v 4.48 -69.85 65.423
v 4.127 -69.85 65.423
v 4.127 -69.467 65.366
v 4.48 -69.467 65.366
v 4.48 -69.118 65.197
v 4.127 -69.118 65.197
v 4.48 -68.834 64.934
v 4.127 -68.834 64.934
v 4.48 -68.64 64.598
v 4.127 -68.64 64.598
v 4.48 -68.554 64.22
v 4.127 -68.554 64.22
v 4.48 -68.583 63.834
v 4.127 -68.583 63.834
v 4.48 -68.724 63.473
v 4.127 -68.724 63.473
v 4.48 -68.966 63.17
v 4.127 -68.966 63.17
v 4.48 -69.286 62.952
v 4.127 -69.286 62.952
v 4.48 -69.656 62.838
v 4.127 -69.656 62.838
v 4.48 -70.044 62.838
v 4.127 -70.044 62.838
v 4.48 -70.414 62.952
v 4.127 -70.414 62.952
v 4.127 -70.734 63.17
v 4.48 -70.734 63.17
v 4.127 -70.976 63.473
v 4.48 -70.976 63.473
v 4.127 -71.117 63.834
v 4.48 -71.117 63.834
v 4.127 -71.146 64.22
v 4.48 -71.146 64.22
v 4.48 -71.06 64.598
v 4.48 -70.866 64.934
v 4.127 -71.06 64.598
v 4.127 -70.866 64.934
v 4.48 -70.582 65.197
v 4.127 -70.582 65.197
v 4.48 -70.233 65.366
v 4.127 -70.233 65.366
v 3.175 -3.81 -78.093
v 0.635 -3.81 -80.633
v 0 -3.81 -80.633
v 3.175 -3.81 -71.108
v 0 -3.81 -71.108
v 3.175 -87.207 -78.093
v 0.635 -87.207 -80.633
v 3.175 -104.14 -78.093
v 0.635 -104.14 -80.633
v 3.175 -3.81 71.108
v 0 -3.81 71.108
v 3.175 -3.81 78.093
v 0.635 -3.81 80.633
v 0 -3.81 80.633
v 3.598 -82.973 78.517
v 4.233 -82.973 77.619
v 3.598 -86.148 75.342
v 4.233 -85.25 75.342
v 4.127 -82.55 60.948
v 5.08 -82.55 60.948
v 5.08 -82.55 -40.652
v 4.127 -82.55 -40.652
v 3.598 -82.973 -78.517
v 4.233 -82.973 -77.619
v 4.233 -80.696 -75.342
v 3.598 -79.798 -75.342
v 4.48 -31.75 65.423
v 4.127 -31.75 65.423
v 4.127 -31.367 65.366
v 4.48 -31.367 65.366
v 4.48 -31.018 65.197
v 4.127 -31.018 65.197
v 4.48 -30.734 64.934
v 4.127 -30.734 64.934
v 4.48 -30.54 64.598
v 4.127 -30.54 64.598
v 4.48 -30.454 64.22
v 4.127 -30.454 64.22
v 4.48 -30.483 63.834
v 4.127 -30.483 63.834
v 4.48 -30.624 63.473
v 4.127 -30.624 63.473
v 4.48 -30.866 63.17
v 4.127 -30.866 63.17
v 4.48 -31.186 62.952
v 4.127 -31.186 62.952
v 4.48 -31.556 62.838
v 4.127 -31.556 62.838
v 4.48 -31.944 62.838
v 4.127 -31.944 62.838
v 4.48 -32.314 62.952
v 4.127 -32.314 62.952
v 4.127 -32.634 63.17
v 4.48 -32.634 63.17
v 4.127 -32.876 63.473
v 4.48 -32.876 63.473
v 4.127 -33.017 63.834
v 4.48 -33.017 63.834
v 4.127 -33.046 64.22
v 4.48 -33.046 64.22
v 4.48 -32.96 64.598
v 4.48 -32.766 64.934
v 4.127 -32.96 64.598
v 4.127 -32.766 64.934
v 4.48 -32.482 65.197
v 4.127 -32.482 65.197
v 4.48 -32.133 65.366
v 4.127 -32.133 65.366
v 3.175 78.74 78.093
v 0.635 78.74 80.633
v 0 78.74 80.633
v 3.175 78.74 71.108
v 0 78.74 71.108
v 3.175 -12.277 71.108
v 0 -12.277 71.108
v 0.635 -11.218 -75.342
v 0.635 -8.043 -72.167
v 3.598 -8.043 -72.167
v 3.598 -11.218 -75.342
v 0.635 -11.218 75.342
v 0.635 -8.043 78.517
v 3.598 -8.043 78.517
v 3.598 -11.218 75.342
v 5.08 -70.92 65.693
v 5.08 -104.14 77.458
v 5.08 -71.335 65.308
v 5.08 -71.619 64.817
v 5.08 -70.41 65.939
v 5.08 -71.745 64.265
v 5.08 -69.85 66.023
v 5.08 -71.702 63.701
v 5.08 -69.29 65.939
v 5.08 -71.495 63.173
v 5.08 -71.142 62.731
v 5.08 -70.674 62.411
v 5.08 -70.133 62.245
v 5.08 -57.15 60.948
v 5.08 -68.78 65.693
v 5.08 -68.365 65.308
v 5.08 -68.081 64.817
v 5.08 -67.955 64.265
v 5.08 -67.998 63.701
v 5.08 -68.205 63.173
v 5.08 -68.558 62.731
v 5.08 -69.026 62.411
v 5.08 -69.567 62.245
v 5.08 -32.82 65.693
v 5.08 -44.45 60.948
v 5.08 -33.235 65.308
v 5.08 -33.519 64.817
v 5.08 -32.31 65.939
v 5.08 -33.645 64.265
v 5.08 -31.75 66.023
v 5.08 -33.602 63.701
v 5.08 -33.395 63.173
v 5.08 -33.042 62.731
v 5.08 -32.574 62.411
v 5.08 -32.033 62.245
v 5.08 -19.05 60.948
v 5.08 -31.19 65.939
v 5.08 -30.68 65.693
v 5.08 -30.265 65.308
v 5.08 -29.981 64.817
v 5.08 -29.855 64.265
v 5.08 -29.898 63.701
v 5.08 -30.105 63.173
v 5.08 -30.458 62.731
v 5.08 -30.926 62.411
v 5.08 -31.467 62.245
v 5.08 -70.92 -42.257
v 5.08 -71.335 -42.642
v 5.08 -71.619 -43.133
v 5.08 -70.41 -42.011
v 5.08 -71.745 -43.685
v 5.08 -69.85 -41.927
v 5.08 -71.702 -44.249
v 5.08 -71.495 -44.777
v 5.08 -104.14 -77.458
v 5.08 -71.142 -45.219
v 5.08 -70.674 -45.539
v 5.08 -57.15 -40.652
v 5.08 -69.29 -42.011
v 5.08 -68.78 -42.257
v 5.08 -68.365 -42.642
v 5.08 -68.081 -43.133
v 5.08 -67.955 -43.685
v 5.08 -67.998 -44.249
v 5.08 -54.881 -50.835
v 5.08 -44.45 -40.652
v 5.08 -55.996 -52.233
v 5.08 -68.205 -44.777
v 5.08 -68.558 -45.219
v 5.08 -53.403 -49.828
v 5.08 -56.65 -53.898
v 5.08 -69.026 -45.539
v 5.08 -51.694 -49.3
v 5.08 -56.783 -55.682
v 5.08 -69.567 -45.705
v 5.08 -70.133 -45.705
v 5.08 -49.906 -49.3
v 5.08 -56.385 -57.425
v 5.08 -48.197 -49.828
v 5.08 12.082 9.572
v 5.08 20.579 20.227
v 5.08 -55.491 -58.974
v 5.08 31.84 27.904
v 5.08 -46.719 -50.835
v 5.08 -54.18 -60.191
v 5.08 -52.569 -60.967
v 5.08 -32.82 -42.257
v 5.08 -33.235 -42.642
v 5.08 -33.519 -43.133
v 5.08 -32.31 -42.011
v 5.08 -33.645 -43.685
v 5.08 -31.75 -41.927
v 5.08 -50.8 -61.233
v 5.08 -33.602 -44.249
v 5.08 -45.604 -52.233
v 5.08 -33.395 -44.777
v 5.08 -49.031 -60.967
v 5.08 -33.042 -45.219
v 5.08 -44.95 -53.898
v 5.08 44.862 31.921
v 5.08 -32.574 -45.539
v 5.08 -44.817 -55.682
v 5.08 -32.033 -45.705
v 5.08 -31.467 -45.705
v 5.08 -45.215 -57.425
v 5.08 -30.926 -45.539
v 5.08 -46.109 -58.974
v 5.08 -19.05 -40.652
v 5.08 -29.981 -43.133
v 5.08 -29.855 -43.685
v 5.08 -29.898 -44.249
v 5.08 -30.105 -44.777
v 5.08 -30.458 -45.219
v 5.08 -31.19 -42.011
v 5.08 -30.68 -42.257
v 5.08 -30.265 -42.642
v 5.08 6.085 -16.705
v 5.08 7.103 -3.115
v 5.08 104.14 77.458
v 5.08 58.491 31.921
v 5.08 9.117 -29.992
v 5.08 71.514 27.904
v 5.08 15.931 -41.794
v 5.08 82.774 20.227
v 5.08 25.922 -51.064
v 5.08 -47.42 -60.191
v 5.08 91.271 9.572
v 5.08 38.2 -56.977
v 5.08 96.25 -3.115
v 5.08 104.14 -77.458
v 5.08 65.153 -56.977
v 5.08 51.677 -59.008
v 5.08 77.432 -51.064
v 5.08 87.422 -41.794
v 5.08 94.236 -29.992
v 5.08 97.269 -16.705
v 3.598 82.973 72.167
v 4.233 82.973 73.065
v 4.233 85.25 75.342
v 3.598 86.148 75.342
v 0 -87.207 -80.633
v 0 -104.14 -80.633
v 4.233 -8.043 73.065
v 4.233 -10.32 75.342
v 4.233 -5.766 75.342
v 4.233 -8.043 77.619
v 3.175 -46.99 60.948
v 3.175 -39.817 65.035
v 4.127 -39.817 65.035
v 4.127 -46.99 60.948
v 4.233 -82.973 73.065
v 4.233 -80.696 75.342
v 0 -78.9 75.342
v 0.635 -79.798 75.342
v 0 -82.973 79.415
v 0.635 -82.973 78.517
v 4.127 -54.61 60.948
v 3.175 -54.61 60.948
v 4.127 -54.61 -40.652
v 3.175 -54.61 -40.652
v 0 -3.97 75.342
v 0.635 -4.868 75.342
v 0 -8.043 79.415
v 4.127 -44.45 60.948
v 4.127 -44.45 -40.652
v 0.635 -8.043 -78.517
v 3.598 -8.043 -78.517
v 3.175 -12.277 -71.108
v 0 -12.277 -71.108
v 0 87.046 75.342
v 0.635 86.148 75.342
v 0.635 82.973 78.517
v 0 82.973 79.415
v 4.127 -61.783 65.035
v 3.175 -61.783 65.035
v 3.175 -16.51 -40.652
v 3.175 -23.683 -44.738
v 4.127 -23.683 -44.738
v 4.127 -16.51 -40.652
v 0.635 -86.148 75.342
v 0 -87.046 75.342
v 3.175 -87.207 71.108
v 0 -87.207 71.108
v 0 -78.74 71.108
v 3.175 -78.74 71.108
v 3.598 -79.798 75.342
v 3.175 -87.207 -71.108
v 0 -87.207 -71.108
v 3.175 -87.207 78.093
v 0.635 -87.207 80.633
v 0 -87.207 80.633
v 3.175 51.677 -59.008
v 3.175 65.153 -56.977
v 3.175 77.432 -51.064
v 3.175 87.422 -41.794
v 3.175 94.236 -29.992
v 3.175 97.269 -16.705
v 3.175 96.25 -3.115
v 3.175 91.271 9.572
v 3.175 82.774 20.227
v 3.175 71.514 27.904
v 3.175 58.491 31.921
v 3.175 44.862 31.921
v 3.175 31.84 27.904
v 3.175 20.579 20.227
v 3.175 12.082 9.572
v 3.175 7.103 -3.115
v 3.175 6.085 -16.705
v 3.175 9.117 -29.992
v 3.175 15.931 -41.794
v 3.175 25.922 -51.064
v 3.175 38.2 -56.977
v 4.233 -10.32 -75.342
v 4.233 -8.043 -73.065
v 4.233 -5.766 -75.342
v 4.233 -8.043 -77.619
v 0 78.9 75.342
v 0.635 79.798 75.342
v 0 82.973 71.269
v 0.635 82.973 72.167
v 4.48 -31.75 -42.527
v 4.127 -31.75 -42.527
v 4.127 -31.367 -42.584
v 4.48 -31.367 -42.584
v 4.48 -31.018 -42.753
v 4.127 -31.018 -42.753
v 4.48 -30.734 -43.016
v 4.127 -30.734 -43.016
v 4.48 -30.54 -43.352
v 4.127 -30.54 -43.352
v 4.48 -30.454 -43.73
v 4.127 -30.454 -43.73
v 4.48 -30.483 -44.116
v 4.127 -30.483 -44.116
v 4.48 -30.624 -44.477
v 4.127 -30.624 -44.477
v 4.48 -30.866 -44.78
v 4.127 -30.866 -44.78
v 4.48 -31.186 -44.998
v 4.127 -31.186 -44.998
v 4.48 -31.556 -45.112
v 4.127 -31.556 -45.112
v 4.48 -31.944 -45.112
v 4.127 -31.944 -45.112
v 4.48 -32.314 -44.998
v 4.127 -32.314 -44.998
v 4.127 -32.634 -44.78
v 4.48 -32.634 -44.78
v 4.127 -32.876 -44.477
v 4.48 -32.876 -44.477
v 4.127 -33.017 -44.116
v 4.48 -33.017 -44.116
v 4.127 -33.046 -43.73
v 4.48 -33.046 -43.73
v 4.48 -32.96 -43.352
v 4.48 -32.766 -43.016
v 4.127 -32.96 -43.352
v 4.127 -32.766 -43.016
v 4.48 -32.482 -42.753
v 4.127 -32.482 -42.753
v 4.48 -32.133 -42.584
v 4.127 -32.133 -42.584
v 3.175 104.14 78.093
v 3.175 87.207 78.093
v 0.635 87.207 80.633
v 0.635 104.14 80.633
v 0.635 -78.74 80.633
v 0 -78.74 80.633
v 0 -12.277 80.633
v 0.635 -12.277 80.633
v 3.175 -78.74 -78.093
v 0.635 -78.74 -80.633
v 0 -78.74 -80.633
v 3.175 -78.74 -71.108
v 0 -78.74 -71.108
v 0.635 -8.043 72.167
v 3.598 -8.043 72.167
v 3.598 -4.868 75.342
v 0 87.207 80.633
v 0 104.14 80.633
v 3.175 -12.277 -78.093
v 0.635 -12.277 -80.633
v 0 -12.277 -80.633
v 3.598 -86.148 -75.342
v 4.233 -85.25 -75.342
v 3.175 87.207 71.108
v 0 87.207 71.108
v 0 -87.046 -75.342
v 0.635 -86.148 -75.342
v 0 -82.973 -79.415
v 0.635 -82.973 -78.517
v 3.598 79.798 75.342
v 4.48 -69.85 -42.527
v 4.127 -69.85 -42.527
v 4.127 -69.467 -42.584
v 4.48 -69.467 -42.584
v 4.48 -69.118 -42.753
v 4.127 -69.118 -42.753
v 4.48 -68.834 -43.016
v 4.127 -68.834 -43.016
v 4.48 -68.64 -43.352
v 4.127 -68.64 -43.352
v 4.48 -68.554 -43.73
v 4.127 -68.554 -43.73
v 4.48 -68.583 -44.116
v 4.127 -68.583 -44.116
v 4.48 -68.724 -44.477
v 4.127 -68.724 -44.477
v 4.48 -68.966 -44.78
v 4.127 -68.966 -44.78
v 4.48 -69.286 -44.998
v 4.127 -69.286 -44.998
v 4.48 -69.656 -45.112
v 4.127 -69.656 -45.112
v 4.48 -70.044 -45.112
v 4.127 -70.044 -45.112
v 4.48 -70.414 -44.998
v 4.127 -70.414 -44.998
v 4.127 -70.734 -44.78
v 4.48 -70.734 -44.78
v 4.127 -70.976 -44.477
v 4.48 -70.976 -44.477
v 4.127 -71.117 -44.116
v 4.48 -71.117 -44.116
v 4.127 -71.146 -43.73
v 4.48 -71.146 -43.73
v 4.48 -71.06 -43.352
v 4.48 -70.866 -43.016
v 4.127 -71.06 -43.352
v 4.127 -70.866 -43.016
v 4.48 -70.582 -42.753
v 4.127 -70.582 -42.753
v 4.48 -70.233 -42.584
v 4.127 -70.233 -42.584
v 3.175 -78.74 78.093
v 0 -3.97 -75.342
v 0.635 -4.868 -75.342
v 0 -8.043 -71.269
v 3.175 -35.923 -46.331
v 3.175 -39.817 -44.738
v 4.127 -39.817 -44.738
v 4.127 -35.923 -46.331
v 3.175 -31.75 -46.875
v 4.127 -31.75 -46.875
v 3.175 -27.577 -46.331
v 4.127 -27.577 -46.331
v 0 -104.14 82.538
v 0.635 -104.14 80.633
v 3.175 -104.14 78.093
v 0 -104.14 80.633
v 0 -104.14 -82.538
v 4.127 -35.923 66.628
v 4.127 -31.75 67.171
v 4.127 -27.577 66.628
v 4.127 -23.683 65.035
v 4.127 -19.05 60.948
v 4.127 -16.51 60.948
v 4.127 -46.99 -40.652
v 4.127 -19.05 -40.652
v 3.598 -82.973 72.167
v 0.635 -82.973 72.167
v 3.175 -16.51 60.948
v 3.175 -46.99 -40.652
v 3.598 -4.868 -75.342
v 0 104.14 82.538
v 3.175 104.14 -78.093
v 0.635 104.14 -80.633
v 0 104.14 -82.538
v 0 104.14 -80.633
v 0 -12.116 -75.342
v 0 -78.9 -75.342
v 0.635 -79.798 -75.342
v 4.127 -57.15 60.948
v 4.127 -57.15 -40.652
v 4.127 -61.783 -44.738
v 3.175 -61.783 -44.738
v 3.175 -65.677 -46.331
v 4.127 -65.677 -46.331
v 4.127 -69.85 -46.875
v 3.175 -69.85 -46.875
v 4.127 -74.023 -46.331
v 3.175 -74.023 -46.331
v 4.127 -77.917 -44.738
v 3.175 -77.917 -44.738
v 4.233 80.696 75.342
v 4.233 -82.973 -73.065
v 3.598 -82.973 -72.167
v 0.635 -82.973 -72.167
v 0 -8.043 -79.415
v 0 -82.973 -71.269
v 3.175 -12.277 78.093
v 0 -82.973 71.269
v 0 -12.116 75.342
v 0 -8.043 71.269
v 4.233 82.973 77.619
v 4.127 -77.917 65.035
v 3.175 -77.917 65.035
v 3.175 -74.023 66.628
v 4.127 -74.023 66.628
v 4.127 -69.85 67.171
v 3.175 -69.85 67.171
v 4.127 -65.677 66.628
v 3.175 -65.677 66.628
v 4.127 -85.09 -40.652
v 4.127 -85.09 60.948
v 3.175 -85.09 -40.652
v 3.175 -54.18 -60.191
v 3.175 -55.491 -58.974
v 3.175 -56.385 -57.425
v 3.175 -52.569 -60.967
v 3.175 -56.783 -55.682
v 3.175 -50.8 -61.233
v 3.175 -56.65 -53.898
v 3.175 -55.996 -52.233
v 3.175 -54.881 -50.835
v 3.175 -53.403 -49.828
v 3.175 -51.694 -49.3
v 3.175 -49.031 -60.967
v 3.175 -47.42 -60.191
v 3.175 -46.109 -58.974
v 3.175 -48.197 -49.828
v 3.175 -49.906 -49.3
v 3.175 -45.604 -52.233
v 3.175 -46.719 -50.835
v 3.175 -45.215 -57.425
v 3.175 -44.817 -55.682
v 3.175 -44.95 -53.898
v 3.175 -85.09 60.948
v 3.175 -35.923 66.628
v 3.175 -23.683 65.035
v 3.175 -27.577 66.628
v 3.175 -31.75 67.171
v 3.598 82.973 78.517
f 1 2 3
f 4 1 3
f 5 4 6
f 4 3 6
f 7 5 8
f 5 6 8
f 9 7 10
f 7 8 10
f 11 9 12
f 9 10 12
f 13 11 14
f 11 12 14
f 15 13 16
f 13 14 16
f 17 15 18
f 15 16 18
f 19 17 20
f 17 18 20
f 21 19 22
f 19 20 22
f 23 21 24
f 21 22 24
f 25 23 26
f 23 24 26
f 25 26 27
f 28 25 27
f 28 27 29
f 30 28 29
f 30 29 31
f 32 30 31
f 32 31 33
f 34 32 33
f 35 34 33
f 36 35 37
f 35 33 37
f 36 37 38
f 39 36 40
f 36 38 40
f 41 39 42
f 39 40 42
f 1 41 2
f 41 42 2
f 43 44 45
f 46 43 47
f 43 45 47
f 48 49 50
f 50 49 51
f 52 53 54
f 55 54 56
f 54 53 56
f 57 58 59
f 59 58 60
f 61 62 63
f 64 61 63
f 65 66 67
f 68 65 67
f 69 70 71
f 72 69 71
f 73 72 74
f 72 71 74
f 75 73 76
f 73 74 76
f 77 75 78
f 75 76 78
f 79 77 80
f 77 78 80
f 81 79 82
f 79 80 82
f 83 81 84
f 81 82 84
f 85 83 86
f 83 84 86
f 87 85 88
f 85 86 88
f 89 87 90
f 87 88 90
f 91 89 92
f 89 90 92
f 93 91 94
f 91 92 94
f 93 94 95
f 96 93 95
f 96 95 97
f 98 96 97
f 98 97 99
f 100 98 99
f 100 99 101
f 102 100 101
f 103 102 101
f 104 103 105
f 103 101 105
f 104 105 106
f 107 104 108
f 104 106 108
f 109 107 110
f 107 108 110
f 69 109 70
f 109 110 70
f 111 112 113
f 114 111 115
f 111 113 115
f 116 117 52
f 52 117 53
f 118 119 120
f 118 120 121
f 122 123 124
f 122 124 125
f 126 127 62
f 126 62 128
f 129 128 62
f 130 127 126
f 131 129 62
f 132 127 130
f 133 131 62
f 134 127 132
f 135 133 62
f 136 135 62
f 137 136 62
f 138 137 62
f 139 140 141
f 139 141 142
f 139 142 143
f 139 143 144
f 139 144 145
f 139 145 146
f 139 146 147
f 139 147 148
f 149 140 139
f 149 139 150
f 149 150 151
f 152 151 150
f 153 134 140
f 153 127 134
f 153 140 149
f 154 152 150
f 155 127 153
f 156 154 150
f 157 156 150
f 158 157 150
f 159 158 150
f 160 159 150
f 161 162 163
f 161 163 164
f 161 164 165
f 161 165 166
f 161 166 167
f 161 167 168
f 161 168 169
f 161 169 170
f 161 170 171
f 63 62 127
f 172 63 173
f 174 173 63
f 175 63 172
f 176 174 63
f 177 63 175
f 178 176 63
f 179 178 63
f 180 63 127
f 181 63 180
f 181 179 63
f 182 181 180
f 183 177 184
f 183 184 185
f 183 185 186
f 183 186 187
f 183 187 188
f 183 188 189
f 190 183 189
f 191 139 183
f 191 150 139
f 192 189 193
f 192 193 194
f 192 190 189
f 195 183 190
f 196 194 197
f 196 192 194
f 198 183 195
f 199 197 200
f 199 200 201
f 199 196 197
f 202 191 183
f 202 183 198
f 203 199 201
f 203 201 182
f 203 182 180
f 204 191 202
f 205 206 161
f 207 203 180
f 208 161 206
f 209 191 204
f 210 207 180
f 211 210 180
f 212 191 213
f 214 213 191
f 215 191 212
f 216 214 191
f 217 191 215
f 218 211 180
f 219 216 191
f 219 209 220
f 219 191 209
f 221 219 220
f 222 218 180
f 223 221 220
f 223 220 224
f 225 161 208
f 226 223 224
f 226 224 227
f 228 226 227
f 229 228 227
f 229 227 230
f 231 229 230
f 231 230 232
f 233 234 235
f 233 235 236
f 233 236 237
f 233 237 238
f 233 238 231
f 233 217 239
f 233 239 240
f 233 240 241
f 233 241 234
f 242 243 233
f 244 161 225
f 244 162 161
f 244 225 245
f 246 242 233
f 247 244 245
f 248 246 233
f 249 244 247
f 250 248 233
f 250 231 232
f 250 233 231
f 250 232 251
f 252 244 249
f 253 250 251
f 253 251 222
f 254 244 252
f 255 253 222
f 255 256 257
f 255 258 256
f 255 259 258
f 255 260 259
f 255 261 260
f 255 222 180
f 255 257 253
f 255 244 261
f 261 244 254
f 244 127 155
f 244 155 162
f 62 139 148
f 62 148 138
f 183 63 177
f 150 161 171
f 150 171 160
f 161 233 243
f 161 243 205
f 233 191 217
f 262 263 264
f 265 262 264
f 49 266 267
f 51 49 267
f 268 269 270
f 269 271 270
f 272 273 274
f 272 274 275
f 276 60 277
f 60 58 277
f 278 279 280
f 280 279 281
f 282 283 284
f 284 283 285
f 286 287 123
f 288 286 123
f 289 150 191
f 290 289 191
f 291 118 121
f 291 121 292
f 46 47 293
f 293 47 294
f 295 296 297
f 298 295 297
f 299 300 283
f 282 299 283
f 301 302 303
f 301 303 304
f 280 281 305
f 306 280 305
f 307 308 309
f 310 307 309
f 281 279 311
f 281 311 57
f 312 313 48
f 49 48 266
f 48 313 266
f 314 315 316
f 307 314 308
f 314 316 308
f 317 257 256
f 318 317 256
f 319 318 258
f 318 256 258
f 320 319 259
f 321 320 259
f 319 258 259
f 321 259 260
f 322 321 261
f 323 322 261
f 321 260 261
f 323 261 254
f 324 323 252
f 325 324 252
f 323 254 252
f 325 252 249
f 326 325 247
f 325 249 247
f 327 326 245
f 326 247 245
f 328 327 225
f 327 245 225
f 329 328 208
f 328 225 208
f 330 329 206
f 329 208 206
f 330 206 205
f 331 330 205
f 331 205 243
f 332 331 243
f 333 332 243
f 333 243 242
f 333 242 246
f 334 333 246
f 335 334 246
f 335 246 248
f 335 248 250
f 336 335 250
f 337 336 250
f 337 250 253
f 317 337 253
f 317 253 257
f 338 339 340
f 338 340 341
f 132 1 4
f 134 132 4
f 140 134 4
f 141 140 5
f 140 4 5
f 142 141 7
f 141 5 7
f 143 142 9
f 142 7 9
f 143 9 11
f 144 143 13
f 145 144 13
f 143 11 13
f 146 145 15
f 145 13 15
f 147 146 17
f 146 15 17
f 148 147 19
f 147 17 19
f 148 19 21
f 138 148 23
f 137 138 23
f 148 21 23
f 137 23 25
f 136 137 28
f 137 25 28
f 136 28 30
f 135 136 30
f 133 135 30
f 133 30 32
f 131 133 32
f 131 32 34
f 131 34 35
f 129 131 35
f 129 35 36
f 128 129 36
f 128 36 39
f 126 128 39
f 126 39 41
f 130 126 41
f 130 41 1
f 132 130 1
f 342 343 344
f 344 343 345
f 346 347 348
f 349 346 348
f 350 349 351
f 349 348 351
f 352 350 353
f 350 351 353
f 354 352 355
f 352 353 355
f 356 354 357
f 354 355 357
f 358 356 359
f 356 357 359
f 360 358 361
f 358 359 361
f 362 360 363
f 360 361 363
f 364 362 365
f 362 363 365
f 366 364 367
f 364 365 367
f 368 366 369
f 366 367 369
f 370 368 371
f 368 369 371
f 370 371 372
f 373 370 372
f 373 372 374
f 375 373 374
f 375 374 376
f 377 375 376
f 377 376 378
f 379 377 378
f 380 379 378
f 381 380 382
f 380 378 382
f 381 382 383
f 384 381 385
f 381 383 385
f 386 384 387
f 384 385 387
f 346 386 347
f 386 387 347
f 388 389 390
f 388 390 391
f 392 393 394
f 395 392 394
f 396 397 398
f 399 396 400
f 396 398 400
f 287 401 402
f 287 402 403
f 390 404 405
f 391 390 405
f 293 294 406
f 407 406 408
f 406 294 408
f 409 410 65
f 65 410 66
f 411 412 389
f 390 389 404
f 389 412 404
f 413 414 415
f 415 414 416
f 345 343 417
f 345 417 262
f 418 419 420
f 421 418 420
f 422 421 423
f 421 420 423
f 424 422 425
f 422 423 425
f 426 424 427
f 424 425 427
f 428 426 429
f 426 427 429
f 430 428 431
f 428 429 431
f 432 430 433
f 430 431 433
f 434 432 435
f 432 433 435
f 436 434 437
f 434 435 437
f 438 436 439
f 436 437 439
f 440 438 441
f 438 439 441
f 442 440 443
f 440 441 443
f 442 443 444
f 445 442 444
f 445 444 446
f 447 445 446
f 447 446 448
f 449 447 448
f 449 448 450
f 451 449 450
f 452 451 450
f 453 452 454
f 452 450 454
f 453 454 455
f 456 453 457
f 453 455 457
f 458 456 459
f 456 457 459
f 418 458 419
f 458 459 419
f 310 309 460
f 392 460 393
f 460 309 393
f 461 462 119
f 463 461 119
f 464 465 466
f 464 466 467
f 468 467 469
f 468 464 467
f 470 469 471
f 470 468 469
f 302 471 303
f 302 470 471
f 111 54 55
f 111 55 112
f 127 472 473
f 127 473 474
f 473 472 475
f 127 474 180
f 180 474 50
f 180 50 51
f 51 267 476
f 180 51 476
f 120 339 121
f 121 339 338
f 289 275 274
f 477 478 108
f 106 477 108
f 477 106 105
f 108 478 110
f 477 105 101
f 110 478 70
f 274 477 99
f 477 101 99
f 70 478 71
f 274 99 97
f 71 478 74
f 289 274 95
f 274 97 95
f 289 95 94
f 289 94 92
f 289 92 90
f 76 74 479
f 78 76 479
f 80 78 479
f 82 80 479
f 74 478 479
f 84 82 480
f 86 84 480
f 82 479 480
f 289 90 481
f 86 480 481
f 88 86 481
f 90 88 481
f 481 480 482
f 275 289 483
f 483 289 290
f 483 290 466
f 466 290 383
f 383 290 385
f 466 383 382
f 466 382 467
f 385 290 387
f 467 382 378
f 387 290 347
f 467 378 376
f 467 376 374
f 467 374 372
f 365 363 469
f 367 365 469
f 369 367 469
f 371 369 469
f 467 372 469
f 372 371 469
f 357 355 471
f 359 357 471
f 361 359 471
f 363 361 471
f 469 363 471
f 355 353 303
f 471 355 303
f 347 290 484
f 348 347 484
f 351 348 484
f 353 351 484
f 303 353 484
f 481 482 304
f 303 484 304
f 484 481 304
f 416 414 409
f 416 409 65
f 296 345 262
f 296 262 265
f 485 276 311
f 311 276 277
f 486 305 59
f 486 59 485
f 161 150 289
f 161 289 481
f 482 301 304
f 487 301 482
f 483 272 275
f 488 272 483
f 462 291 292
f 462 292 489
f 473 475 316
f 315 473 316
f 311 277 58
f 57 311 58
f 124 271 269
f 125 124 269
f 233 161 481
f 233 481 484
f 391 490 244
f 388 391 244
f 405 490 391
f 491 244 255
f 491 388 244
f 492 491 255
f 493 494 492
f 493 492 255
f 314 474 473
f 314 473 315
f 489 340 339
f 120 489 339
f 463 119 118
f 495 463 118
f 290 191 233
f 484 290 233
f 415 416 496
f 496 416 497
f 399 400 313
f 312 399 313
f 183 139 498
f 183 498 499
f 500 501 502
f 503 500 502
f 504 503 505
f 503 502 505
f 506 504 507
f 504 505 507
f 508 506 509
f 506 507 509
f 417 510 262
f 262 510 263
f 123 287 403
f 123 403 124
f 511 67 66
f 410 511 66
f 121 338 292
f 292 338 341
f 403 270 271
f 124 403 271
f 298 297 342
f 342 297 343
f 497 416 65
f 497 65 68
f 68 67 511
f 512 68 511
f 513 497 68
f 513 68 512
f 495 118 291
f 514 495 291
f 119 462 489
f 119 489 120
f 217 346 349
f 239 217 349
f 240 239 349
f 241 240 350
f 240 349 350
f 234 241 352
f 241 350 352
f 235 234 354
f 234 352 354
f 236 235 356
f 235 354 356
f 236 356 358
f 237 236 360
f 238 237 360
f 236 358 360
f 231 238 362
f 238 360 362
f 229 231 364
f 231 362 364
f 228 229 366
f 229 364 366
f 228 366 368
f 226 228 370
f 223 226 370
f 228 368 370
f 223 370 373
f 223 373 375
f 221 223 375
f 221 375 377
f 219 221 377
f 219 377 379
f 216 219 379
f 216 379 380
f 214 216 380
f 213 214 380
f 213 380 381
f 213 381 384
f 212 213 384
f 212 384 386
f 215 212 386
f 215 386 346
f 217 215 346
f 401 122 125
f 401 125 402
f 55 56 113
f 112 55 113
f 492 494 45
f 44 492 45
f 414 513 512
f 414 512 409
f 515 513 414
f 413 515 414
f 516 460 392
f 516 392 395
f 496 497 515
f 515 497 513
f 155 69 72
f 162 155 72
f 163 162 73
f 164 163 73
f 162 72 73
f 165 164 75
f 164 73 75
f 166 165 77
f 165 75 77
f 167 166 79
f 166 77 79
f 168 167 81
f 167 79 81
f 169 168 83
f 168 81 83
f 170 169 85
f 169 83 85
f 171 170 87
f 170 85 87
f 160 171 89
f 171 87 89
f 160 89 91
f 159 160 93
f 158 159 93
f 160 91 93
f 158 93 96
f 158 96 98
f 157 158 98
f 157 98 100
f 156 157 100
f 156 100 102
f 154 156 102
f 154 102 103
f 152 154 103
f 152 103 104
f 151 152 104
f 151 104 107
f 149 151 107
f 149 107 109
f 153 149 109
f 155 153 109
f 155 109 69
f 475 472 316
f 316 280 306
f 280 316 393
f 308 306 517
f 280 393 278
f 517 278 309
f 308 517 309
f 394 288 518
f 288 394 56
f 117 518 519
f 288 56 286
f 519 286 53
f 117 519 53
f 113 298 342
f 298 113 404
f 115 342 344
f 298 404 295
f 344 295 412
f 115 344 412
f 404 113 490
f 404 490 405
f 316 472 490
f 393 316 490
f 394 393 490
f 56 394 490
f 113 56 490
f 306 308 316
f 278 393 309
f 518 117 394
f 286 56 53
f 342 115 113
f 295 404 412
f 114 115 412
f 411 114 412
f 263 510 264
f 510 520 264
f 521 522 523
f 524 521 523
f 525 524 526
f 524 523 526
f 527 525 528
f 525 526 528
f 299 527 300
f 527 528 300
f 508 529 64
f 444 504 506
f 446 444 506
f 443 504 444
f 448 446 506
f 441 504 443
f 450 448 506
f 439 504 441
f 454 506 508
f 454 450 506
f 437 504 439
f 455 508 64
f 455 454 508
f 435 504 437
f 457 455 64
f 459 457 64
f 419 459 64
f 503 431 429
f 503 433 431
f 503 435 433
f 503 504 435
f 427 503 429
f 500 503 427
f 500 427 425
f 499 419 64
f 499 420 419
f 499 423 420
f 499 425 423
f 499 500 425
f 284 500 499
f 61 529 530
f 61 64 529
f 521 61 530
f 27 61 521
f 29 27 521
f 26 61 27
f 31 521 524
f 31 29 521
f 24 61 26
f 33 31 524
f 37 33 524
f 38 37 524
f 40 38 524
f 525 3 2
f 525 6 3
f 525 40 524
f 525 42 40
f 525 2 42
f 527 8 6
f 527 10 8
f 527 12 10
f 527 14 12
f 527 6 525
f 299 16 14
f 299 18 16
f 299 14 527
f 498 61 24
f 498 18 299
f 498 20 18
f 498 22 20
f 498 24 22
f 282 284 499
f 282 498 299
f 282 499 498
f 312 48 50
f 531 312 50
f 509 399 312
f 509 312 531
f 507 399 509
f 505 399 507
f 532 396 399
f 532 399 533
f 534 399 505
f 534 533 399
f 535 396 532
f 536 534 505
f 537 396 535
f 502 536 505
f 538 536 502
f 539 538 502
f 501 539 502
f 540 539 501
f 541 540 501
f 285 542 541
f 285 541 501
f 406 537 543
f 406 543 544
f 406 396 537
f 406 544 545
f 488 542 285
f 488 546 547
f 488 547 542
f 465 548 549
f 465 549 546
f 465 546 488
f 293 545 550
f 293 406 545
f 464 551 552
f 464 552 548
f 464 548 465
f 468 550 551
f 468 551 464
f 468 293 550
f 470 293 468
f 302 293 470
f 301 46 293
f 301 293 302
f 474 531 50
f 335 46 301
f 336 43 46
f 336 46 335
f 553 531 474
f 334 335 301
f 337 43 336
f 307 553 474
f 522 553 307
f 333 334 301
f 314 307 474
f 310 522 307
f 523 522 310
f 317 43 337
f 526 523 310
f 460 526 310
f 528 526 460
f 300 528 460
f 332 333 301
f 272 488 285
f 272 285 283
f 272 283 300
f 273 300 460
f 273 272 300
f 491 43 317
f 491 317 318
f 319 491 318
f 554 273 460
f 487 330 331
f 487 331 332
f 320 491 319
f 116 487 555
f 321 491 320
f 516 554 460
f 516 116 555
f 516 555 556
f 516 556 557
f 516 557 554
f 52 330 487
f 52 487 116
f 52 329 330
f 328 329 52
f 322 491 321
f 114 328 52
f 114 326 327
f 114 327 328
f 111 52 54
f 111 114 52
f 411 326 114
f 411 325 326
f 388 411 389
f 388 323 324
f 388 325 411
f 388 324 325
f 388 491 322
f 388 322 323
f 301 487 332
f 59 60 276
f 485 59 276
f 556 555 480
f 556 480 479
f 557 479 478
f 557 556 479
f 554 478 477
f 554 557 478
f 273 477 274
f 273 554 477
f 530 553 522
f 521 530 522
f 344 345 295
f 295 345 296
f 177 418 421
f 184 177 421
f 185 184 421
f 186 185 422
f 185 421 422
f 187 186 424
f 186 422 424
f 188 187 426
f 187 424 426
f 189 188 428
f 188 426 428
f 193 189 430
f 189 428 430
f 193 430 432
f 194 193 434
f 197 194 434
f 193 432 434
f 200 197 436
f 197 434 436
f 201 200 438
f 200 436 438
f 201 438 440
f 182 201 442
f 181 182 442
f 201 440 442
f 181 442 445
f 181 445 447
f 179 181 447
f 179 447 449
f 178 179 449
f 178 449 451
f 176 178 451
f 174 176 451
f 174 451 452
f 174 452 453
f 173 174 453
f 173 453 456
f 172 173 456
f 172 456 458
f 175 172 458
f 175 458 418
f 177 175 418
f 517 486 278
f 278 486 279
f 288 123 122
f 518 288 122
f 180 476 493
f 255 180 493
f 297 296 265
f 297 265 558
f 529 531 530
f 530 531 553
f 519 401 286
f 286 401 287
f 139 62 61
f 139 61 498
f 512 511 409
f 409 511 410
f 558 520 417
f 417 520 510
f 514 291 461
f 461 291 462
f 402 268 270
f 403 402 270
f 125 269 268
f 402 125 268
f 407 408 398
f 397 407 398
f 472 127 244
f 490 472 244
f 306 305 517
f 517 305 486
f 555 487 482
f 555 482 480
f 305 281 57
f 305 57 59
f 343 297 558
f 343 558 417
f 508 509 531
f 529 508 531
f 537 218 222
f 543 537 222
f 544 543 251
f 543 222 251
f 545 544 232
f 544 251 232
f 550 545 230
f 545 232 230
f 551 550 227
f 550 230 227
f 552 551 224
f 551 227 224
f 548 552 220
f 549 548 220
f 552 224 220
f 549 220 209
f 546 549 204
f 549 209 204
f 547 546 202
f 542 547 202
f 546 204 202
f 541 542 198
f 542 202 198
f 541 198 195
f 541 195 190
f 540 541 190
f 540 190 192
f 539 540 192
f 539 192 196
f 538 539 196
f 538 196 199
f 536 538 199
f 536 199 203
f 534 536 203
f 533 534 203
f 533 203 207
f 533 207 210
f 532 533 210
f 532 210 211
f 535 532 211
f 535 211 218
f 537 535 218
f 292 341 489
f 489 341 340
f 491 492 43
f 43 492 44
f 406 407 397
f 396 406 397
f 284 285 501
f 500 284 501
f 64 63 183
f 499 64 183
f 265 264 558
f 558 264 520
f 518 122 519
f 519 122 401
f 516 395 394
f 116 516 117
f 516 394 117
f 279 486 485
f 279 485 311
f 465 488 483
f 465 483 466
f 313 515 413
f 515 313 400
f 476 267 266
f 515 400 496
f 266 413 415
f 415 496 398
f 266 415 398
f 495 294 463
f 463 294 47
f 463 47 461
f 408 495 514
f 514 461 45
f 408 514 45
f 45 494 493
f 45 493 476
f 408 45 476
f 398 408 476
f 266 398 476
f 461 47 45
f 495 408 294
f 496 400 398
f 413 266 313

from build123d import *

# Parameters (mm, degrees)
SKETCH1_W                      = 165.076666628
SKETCH1_H                      = 208.28
BOSS_EXTRUDE1_DEPTH            = 5.08
CUT_EXTRUDE1_DEPTH             = 3.175
CUT_EXTRUDE2_REACH             = 134.979
SKETCH8_R                      = 45.72
CUT_EXTRUDE3_REACH             = 134.979
SKETCH9_R                      = 6
SKETCH9_W                      = 101.6
SKETCH9_H                      = 25.4
M2_CLEARANCE_HOLE1_D           = 2.6
M2_CLEARANCE_HOLE1_CSINK_D     = 3.8
M2_CLEARANCE_HOLE1_CSINK_ANGLE = 90
CUT_EXTRUDE4_DEPTH             = 0.9525
CUT_EXTRUDE7_DEPTH             = 4.233333418
CHAMFER1_SIZE                  = 0.635
CHAMFER2_SIZE                  = 2.54
CHAMFER3_SIZE                  = 5.08


with BuildPart() as part:
    # Sketch1 → Boss-Extrude1 (new body)
    with BuildSketch(Plane(origin=(0, 0, 0), x_dir=(0, 0, -1), z_dir=(1, 0, 0))):
        Rectangle(SKETCH1_W, SKETCH1_H)
    extrude(amount=BOSS_EXTRUDE1_DEPTH)

    # Sketch3 → Cut-Extrude1 (cut)
    with BuildSketch(Plane.ZY):
        Polygon((-80.633333314, -12.276666667), (-80.633333314, -78.740000169), (-71.108333314, -78.740000169), (-71.108333314, -87.206666836), (-80.633333314, -87.206666836), (-80.633333314, -104.14), (80.633333314, -104.14), (80.633333314, -87.206666836), (71.108333314, -87.206666836), (71.108333314, -78.740000169), (80.633333314, -78.740000169), (80.633333314, -12.276666667), (71.108333314, -12.276666667), (71.108333314, -3.81), (80.633333314, -3.81), (80.633333314, 78.74), (71.108333314, 78.74), (71.108333314, 87.206666667), (80.633333314, 87.206666667), (80.633333314, 104.14), (-80.633333314, 104.14), (-80.633333314, -3.81), (-71.108333314, -3.81), (-71.108333314, -12.276666667), align=None)
    extrude(amount=-CUT_EXTRUDE1_DEPTH, mode=Mode.SUBTRACT)

    # Sketch8 → Cut-Extrude2 (cut, up to next)
    with BuildSketch(Plane(origin=(5.08, 0, 0), x_dir=(0, 0, -1), z_dir=(1, 0, 0)), mode=Mode.PRIVATE) as cut_extrude2_sk1:
        with Locations((13.288333225, 51.676668489)):
            Circle(SKETCH8_R)
    cut_extrude2_tool1 = extrude(cut_extrude2_sk1.sketch, amount=-CUT_EXTRUDE2_REACH, mode=Mode.PRIVATE) & part.part
    add(cut_extrude2_tool1.solids().sort_by_distance((5.08, 51.676668, -13.288333))[0], mode=Mode.SUBTRACT)

    # Sketch9 → Cut-Extrude3 (cut, up to next)
    with BuildSketch(Plane(origin=(5.08, 0, 0), x_dir=(0, 0, -1), z_dir=(1, 0, 0)), mode=Mode.PRIVATE) as cut_extrude3_sk1:
        with Locations((55.233333314, -50.8)):
            Circle(SKETCH9_R)
    cut_extrude3_tool1 = extrude(cut_extrude3_sk1.sketch, amount=-CUT_EXTRUDE3_REACH, mode=Mode.PRIVATE) & part.part
    # Sketch9 → Cut-Extrude3 (cut, up to next)
    with BuildSketch(Plane(origin=(5.08, 0, 0), x_dir=(0, 0, -1), z_dir=(1, 0, 0)), mode=Mode.PRIVATE) as cut_extrude3_sk2:
        with Locations((-10.148333314, -31.75)):
            Rectangle(SKETCH9_W, SKETCH9_H)
    cut_extrude3_tool2 = extrude(cut_extrude3_sk2.sketch, amount=-CUT_EXTRUDE3_REACH, mode=Mode.PRIVATE) & part.part
    # Sketch9 → Cut-Extrude3 (cut, up to next)
    with BuildSketch(Plane(origin=(5.08, 0, 0), x_dir=(0, 0, -1), z_dir=(1, 0, 0)), mode=Mode.PRIVATE) as cut_extrude3_sk3:
        with Locations((-10.148333314, -69.85)):
            Rectangle(SKETCH9_W, SKETCH9_H)
    cut_extrude3_tool3 = extrude(cut_extrude3_sk3.sketch, amount=-CUT_EXTRUDE3_REACH, mode=Mode.PRIVATE) & part.part
    add(cut_extrude3_tool1.solids().sort_by_distance((5.08, -50.8, -55.233333))[0], mode=Mode.SUBTRACT)
    add(cut_extrude3_tool2.solids().sort_by_distance((5.08, -31.75, 10.148333))[0], mode=Mode.SUBTRACT)
    add(cut_extrude3_tool3.solids().sort_by_distance((5.08, -69.85, 10.148333))[0], mode=Mode.SUBTRACT)

    # M2 Clearance Hole1 (through all)
    with Locations(Plane(origin=(5.08, 0, 0), x_dir=(0, 0, -1), z_dir=(1, 0, 0))):
        with Locations((-64.123333314, -69.85), (43.826666686, -69.85), (43.826666686, -31.75), (-64.123333314, -31.75)):
            CounterSinkHole(M2_CLEARANCE_HOLE1_D / 2, M2_CLEARANCE_HOLE1_CSINK_D / 2, counter_sink_angle=M2_CLEARANCE_HOLE1_CSINK_ANGLE)

    # Sketch12 → Cut-Extrude4 (cut)
    with BuildSketch(Plane.ZY.offset(-3.175)):
        with BuildLine():
            Line((-40.651666686, -16.51), (60.948333314, -16.51))
            Line((60.948333314, -16.51), (65.034587615, -23.682694807))
            ThreePointArc((65.034587615, -23.682694807), (67.171333314, -31.75), (65.034587615, -39.817305193))
            Line((65.034587615, -39.817305193), (60.948333314, -46.99))
            Line((60.948333314, -46.99), (-40.651666686, -46.99))
            Line((-40.651666686, -46.99), (-44.737920986, -39.817305193))
            ThreePointArc((-44.737920986, -39.817305193), (-46.874666686, -31.75), (-44.737920986, -23.682694807))
            Line((-44.737920986, -23.682694807), (-40.651666686, -16.51))
        make_face()
        with BuildLine():
            Line((-44.737920986, -77.917305193), (-40.651666686, -85.09))
            Line((-40.651666686, -85.09), (60.948333314, -85.09))
            Line((60.948333314, -85.09), (65.034587615, -77.917305193))
            ThreePointArc((65.034587615, -77.917305193), (67.171333314, -69.85), (65.034587615, -61.782694807))
            Line((65.034587615, -61.782694807), (60.948333314, -54.61))
            Line((60.948333314, -54.61), (-40.651666686, -54.61))
            Line((-40.651666686, -54.61), (-44.737920986, -61.782694807))
            ThreePointArc((-44.737920986, -61.782694807), (-46.874666686, -69.85), (-44.737920986, -77.917305193))
        make_face()
    extrude(amount=-CUT_EXTRUDE4_DEPTH, mode=Mode.SUBTRACT)

    # Sketch13 → Cut-Extrude7 (cut)
    with BuildSketch(Plane.ZY):
        Polygon((-78.516666732, -8.043333333), (-75.341666732, -4.868333333), (-72.166666732, -8.043333333), (-75.341666732, -11.218333333), align=None)
        Polygon((-78.516666732, -82.973333503), (-75.341666732, -79.798333503), (-72.166666732, -82.973333503), (-75.341666732, -86.148333503), align=None)
        Polygon((72.166666732, -82.973333503), (75.341666732, -79.798333503), (78.516666732, -82.973333503), (75.341666732, -86.148333503), align=None)
        Polygon((72.166666732, -8.043333333), (75.341666732, -4.868333333), (78.516666732, -8.043333333), (75.341666732, -11.218333333), align=None)
        Polygon((72.166666732, 82.973333333), (75.341666732, 86.148333333), (78.516666732, 82.973333333), (75.341666732, 79.798333333), align=None)
    extrude(amount=-CUT_EXTRUDE7_DEPTH, mode=Mode.SUBTRACT)

    # Chamfer1
    chamfer1_edges = [part.edges().sort_by_distance(p)[0] for p in [
        (4.233333418, 81.385833333, 73.754166732),
        (4.233333418, 84.560833333, 73.754166732),
        (4.233333418, 84.560833333, 76.929166732),
        (4.233333418, 81.385833333, 76.929166732),
        (0, 81.385833333, 73.754166732),
        (0, 81.385833333, 76.929166732),
        (0, 84.560833333, 76.929166732),
        (0, 84.560833333, 73.754166732),
        (4.233333418, -9.630833333, 73.754166732),
        (4.233333418, -6.455833333, 73.754166732),
        (4.233333418, -6.455833333, 76.929166732),
        (4.233333418, -9.630833333, 76.929166732),
        (0, -9.630833333, 73.754166732),
        (0, -9.630833333, 76.929166732),
        (0, -6.455833333, 76.929166732),
        (0, -6.455833333, 73.754166732),
        (4.233333418, -84.560833503, 73.754166732),
        (4.233333418, -81.385833503, 73.754166732),
        (4.233333418, -81.385833503, 76.929166732),
        (4.233333418, -84.560833503, 76.929166732),
        (0, -84.560833503, 73.754166732),
        (0, -84.560833503, 76.929166732),
        (0, -81.385833503, 76.929166732),
        (0, -81.385833503, 73.754166732),
        (4.233333418, -84.560833503, -76.929166732),
        (4.233333418, -81.385833503, -76.929166732),
        (4.233333418, -81.385833503, -73.754166732),
        (4.233333418, -84.560833503, -73.754166732),
        (0, -84.560833503, -76.929166732),
        (0, -84.560833503, -73.754166732),
        (0, -81.385833503, -73.754166732),
        (0, -81.385833503, -76.929166732),
        (4.233333418, -9.630833333, -76.929166732),
        (4.233333418, -6.455833333, -76.929166732),
        (4.233333418, -6.455833333, -73.754166732),
        (4.233333418, -9.630833333, -73.754166732),
        (0, -9.630833333, -76.929166732),
        (0, -9.630833333, -73.754166732),
        (0, -6.455833333, -73.754166732),
        (0, -6.455833333, -76.929166732),
    ]]
    chamfer(chamfer1_edges, length=CHAMFER1_SIZE)

    # Chamfer2
    chamfer2_edges = [part.edges().sort_by_distance(p)[0] for p in [
        (3.175, 95.673333333, 80.633333314),
        (3.175, 37.465, 80.633333314),
        (3.175, -45.508333418, 80.633333314),
        (3.175, -95.673333418, 80.633333314),
        (3.175, -95.673333418, -80.633333314),
        (3.175, -45.508333418, -80.633333314),
        (3.175, 50.165, -80.633333314),
    ]]
    chamfer(chamfer2_edges, length=CHAMFER2_SIZE)

    # Chamfer3
    chamfer3_edges = [part.edges().sort_by_distance(p)[0] for p in [
        (5.08, 0, -82.538333314),
        (5.08, 0, 82.538333314),
    ]]
    chamfer(chamfer3_edges, length=CHAMFER3_SIZE - 0.0001)  # a hair under: the kernel refuses the full size


solid = part.part
